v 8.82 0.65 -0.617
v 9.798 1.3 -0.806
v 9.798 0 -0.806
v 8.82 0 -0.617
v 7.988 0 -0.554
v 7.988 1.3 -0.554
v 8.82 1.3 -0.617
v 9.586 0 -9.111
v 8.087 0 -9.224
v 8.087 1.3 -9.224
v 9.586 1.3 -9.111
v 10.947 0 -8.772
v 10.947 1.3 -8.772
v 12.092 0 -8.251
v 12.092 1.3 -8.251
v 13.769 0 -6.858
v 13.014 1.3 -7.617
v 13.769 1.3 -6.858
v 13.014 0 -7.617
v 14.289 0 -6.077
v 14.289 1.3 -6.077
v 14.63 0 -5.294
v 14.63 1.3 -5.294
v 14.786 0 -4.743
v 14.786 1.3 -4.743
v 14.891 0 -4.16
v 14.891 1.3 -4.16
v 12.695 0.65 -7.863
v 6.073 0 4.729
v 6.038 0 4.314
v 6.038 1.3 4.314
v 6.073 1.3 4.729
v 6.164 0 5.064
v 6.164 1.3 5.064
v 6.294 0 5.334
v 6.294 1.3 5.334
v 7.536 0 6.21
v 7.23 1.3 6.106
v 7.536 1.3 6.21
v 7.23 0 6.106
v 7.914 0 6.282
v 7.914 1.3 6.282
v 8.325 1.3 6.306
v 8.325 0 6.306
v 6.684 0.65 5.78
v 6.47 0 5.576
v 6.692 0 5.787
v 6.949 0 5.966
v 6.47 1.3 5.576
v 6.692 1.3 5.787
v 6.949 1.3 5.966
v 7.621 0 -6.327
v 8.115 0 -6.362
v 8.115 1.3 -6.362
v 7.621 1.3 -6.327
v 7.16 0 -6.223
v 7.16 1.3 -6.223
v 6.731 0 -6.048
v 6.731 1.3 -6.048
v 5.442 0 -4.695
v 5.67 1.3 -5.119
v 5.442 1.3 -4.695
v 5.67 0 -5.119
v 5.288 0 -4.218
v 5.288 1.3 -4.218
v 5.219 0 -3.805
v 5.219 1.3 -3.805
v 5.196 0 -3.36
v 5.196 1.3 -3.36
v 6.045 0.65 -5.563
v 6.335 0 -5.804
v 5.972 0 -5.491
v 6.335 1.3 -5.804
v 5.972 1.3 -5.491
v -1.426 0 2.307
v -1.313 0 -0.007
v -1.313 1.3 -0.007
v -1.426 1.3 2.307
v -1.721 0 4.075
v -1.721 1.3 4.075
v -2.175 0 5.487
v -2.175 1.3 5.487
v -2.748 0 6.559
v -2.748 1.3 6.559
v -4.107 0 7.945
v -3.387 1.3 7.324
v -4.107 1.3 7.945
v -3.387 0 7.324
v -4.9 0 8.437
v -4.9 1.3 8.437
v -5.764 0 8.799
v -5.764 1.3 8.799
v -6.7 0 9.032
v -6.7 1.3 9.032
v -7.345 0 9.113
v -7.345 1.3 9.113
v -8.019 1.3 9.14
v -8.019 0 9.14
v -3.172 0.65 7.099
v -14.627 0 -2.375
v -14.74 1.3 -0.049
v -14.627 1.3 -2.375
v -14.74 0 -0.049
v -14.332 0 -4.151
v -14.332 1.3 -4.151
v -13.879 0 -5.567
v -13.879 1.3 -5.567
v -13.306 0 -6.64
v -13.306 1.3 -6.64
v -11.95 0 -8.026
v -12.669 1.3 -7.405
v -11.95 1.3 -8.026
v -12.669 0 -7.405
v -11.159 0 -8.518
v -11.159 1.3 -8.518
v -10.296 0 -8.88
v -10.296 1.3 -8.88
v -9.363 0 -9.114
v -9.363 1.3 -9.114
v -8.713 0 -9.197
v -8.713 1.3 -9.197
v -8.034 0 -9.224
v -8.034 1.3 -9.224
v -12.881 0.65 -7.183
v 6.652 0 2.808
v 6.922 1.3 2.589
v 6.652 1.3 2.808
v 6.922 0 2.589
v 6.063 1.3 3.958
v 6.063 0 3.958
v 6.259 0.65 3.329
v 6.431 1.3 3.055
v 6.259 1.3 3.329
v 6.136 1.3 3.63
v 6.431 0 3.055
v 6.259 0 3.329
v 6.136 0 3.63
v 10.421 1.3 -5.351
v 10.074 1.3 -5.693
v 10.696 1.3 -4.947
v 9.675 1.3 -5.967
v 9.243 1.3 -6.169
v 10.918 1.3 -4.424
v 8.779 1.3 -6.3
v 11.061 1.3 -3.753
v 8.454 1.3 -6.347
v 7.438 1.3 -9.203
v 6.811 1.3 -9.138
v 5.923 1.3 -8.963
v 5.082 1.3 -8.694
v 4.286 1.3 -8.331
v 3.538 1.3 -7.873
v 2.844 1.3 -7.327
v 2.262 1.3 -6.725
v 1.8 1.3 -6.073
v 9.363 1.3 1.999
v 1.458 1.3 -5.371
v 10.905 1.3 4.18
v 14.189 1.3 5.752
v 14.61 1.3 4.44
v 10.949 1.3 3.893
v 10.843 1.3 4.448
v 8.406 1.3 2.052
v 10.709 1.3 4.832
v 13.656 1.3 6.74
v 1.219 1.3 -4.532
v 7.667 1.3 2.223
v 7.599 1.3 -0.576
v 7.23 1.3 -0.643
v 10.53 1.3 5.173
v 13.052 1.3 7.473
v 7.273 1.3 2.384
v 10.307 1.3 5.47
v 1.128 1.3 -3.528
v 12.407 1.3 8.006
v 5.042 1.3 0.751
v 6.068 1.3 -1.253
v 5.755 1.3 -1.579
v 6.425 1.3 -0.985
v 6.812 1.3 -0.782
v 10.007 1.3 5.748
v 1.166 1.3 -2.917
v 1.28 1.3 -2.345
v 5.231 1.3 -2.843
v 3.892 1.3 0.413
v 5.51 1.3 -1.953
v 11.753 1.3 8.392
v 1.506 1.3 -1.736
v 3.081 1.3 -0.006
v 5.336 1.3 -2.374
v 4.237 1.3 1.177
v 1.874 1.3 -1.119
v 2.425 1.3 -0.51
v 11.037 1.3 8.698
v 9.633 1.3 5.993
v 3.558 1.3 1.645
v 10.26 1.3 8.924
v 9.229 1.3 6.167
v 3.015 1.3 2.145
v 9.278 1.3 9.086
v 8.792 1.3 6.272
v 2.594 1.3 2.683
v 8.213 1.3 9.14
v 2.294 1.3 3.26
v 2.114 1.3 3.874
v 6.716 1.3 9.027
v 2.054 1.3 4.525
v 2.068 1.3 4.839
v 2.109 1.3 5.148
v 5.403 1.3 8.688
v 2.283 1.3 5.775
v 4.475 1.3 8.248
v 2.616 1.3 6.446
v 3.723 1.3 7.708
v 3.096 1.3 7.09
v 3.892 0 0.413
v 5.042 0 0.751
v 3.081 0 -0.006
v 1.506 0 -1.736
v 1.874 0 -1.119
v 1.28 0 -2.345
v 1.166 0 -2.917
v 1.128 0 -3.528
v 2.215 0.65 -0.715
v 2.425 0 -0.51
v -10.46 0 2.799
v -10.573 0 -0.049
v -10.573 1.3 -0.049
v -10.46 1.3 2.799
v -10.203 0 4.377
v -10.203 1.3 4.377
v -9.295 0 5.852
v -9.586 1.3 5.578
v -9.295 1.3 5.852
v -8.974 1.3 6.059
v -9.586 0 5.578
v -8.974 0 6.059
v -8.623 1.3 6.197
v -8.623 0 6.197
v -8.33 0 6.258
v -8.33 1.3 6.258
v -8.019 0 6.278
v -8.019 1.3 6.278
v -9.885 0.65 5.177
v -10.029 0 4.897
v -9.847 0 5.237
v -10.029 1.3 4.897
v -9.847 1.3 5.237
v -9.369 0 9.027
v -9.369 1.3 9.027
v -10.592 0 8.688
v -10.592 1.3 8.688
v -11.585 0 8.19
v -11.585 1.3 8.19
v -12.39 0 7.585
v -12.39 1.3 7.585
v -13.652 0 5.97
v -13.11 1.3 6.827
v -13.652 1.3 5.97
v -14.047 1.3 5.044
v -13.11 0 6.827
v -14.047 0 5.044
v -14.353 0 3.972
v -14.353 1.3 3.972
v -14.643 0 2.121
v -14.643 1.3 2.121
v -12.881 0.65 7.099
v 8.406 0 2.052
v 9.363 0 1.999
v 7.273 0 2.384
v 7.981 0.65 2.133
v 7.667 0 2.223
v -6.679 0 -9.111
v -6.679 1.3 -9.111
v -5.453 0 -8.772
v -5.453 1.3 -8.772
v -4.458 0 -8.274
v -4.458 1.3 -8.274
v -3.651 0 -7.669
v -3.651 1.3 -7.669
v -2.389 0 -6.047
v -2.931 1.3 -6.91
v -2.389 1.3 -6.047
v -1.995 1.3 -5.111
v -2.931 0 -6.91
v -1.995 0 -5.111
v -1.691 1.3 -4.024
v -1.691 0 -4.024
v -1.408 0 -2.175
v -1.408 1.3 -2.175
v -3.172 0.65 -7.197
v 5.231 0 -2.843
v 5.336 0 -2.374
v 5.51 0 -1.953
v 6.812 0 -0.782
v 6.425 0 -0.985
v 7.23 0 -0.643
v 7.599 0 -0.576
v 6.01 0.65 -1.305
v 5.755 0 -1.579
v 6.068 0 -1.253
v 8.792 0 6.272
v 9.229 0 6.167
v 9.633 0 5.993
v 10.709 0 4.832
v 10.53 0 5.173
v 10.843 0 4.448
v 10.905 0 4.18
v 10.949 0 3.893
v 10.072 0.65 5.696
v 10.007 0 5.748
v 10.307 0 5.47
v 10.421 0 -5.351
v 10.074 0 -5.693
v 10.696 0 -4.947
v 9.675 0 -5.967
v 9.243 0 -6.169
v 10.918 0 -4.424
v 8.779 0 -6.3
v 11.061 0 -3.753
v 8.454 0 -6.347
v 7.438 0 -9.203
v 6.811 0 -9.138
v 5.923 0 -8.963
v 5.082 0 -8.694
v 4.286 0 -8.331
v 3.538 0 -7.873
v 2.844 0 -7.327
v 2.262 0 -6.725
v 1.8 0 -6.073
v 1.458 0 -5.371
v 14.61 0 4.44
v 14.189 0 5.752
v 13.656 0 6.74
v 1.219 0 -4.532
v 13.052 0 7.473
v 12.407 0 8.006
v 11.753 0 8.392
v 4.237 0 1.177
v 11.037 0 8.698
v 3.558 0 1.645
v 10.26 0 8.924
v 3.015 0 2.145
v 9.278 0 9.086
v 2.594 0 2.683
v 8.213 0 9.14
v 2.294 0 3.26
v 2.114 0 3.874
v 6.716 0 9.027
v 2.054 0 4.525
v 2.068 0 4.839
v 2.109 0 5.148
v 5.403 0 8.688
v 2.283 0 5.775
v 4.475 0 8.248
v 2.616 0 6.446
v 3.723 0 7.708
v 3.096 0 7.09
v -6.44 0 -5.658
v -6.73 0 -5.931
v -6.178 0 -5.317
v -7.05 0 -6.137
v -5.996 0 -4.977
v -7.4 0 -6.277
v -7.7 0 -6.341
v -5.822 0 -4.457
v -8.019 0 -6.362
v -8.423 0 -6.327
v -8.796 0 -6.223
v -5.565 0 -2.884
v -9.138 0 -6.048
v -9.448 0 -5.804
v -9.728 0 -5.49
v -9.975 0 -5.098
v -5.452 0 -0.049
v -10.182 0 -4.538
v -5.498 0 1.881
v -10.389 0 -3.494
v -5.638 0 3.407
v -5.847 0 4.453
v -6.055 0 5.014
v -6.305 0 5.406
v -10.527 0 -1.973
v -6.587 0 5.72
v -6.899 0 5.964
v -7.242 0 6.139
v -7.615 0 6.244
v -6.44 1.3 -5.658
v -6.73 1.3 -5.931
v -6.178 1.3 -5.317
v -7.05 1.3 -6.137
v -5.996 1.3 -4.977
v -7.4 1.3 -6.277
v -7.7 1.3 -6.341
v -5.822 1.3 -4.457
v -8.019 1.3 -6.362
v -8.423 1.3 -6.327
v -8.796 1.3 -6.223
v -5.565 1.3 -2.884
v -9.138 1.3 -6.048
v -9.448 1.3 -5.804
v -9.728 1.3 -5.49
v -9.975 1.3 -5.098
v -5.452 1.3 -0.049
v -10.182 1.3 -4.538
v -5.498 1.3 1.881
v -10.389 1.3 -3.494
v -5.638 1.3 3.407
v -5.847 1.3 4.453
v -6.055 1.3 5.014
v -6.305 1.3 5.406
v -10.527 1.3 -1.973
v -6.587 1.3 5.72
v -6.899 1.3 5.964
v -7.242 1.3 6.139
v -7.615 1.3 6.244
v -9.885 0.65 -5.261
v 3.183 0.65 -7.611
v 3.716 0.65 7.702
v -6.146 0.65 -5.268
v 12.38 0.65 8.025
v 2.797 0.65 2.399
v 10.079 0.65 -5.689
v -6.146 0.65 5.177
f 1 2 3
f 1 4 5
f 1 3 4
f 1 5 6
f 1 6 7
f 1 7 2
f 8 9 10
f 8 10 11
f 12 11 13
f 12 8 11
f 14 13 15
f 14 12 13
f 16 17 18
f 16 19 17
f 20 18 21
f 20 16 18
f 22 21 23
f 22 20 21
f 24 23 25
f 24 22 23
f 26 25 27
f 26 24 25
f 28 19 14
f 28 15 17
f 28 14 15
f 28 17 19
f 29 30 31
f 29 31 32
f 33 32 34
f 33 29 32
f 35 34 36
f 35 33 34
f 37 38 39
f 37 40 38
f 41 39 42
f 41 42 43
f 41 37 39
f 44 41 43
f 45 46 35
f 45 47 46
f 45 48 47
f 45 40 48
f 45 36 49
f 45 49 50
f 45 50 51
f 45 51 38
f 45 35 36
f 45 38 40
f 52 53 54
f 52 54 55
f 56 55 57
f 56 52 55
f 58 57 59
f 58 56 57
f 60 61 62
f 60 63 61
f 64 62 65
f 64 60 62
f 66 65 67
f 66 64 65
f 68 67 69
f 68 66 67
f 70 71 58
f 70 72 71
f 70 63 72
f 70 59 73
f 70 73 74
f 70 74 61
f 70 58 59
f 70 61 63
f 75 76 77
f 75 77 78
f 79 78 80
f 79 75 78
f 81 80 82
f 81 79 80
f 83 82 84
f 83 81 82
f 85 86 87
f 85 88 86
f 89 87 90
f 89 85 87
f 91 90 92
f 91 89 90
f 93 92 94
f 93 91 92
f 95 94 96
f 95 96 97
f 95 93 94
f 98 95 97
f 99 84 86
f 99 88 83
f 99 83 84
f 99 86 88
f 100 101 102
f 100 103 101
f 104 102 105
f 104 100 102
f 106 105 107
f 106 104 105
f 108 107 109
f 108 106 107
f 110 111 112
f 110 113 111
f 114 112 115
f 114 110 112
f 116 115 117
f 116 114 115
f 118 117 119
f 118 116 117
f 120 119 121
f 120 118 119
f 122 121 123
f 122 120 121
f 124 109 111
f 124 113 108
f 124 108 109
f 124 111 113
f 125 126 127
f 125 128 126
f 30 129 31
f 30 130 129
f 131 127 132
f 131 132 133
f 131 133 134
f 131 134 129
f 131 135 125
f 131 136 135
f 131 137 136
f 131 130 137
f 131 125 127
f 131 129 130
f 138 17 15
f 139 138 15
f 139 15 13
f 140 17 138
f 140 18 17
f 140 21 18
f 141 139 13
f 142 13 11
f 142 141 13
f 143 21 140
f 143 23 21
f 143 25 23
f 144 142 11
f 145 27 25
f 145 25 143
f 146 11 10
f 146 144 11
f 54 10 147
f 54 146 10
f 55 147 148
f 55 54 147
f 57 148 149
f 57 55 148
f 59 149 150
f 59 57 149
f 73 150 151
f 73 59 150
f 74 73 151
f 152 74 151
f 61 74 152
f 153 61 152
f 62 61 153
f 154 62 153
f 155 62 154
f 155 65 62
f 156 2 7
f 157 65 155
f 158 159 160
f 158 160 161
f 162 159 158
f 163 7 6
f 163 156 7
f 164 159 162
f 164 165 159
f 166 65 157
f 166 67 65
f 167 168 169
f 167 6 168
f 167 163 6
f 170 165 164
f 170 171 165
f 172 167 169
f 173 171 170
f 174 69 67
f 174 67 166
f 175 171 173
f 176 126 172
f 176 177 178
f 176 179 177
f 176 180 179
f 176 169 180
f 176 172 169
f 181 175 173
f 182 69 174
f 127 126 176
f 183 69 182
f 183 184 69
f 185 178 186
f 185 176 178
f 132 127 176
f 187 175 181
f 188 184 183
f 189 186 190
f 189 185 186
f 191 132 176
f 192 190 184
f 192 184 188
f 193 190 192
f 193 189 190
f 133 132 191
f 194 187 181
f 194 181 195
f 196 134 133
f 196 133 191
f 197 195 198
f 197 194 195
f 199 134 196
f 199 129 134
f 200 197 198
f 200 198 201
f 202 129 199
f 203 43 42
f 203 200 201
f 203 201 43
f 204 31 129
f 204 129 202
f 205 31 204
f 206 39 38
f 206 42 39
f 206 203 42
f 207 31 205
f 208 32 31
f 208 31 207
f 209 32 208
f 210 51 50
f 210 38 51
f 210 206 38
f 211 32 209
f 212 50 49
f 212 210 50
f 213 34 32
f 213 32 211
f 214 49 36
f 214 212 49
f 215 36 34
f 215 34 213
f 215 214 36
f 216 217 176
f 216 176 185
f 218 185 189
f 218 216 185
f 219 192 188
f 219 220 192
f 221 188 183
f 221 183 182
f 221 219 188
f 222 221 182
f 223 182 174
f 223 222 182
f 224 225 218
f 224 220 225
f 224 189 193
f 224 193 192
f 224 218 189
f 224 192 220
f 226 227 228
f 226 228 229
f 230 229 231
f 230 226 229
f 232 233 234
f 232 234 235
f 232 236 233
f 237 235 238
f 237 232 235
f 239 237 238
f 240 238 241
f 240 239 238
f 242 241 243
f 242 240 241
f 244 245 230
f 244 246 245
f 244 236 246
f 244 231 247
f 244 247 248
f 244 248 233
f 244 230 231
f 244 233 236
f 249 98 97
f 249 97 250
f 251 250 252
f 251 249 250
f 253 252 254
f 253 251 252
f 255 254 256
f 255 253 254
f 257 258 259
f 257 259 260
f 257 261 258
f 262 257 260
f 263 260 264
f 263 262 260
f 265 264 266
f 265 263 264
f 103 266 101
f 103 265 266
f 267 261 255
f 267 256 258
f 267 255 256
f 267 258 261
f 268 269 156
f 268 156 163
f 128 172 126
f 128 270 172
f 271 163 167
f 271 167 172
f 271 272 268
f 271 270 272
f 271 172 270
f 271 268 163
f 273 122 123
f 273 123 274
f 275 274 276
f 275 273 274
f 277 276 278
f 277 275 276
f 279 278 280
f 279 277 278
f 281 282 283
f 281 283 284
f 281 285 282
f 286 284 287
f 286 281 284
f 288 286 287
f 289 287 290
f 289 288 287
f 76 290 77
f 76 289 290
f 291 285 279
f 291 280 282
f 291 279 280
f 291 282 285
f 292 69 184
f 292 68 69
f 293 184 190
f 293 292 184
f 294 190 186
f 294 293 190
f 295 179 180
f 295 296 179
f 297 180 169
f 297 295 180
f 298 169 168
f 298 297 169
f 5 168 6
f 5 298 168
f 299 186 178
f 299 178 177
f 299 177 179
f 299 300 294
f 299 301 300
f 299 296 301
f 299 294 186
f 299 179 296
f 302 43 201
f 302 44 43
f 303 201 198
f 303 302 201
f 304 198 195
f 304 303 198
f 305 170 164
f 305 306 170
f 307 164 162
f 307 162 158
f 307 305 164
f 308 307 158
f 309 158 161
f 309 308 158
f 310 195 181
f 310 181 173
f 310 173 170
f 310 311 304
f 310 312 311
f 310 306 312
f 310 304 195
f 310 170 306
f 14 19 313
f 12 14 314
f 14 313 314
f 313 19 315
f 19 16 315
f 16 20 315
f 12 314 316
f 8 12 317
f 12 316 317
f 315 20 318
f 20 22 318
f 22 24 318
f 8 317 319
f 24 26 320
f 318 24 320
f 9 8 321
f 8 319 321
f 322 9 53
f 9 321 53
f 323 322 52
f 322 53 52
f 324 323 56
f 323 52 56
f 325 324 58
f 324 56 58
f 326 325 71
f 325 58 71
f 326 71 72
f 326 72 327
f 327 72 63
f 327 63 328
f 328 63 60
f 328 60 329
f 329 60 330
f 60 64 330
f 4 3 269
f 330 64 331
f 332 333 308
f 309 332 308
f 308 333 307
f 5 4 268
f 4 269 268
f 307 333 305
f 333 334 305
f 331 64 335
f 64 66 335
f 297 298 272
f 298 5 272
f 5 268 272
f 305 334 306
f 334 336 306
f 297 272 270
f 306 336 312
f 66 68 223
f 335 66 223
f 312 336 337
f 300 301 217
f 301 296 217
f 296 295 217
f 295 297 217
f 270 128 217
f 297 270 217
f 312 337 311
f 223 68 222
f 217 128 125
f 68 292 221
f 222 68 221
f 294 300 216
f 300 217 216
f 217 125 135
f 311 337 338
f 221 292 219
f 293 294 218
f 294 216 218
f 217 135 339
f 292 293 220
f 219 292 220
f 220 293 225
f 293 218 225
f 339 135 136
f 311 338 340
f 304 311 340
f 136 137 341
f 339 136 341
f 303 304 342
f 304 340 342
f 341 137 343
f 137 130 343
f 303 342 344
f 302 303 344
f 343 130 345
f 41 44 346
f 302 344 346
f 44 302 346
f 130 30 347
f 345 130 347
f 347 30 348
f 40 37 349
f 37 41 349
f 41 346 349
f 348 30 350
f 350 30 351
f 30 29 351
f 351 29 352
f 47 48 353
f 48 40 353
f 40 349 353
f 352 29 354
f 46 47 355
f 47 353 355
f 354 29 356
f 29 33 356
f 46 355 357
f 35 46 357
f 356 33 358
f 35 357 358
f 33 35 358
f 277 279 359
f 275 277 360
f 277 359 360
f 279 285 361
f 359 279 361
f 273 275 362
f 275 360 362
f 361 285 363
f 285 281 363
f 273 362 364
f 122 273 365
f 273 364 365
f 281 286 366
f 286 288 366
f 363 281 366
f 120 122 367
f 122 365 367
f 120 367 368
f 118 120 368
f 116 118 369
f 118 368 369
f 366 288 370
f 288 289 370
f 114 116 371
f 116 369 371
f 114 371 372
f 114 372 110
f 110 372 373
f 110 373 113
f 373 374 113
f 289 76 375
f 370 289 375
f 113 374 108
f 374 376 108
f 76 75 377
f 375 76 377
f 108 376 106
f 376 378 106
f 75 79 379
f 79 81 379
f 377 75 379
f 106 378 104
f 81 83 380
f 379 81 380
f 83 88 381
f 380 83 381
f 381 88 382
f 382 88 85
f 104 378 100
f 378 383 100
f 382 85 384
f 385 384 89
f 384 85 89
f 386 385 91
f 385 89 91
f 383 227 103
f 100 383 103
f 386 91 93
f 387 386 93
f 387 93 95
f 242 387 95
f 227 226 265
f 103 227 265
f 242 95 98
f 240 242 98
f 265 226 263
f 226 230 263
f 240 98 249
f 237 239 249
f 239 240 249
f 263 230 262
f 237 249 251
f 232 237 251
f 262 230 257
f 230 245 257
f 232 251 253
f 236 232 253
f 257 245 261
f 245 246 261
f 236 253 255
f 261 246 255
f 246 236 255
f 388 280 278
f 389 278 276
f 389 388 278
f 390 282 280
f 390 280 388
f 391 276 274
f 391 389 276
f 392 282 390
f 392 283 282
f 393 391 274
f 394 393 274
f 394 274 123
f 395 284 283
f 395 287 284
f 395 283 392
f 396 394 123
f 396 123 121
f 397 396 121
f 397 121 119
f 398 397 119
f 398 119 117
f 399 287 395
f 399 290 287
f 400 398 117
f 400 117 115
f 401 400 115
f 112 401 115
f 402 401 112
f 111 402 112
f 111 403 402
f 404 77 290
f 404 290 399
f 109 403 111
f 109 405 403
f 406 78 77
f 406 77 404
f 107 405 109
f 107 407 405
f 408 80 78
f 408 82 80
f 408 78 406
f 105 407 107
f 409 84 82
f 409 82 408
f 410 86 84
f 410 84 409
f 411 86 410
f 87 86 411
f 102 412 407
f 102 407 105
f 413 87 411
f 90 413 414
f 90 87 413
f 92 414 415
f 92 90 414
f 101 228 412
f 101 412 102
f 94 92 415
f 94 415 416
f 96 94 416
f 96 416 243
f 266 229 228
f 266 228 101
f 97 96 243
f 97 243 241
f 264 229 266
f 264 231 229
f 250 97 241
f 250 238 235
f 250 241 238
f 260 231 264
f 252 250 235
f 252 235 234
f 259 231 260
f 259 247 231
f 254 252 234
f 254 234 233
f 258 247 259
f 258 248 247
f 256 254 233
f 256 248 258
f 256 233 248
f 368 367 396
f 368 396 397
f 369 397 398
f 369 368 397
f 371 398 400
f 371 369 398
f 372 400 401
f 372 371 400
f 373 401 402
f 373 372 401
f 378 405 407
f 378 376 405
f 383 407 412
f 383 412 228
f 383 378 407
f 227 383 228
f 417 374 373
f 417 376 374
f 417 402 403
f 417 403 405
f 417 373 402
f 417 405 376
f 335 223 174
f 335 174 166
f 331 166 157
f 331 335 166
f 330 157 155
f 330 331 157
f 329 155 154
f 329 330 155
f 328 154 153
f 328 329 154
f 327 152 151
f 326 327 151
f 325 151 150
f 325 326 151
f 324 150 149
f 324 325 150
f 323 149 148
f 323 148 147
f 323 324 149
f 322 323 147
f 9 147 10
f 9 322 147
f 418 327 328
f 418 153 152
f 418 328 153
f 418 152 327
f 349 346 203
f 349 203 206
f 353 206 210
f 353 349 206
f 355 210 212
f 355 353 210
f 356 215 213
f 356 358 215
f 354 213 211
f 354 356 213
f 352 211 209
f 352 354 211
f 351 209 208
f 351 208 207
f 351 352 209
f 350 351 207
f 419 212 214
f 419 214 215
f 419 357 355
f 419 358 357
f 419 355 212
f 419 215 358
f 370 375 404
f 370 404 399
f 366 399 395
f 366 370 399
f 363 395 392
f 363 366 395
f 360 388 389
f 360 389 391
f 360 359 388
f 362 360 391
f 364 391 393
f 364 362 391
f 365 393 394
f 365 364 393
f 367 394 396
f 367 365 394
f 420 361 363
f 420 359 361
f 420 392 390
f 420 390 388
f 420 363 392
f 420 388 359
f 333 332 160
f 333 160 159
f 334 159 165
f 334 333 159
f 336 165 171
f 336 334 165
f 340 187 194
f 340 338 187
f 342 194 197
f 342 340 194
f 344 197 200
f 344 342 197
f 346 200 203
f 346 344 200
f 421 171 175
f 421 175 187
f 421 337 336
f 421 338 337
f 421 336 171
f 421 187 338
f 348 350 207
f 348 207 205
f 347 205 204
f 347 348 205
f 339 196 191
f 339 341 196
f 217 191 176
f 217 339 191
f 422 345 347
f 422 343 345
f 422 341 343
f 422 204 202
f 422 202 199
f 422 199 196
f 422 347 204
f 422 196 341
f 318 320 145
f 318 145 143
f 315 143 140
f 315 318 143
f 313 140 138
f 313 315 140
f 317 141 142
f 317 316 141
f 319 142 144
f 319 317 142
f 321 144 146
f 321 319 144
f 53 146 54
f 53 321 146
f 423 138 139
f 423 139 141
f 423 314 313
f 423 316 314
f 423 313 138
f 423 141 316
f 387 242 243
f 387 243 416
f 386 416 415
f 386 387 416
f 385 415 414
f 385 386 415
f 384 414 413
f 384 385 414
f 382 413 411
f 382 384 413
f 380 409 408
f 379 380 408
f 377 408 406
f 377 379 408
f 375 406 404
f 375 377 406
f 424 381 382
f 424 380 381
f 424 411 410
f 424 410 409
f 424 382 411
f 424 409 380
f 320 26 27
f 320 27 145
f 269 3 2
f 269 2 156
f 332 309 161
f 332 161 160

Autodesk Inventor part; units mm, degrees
ref_plane "YZ Plane" through (0, 0, 0) normal (1, 0, 0) x (0, 1, 0)
ref_plane "XZ Plane" through (0, 0, 0) normal (0, 1, 0) x (-1, 0, 0)
ref_plane "XY Plane" through (0, 0, 0) normal (0, 0, 1) x (1, 0, 0)
sketch "Sketch1" plane through (0, 0, 0) normal (0, 1, 0) x (-1, 0, 0)
  line L0 (-15.9712, 9.1405) -> (15.5875, 9.1405) construction
  line L1 (15.5875, 9.1405) -> (15.5875, -9.9475) construction
  line L2 (15.5875, -9.9475) -> (-15.9712, -9.9475) construction
  line L3 (-15.9712, -9.9475) -> (-15.9712, 9.1405) construction
  line L4 (-14.8909, -4.1596) -> (-11.0608, -3.7528)
  spline S0 degree 2 poles (-11.0608, -3.7528) (-10.9065, -5.0154) (-9.251, -6.3623) (-8.1146, -6.3623) knots 0 0 0 1 2 2 2
  spline S1 degree 2 poles (-8.1146, -6.3623) (-6.894, -6.3623) (-5.1965, -4.7629) (-5.1965, -3.3599) knots 0 0 0 1 2 2 2
  spline S2 degree 2 poles (-5.1965, -3.3599) (-5.1965, -2.0552) (-6.8239, -0.554) (-7.9884, -0.554) knots 0 0 0 1 2 2 2
  spline S3 degree 2 poles (-7.9884, -0.554) (-8.746, -0.554) (-9.7982, -0.8065) knots 0 0 0 1 1 1
  line L5 (-9.7982, -0.8065) -> (-9.3633, 1.9994)
  spline S4 degree 2 poles (-9.3633, 1.9994) (-7.82, 1.9713) (-6.9221, 2.5886) knots 0 0 0 1 1 1
  spline S5 degree 2 poles (-6.9221, 2.5886) (-6.0382, 3.2059) (-6.0382, 4.3143) knots 0 0 0 1 1 1
  spline S6 degree 2 poles (-6.0382, 4.3143) (-6.0382, 5.2543) (-7.329, 6.3065) (-8.3251, 6.3065) knots 0 0 0 1 2 2 2
  spline S7 degree 2 poles (-8.3251, 6.3065) (-9.3352, 6.3065) (-10.8083, 5.0859) (-10.9486, 3.8934) knots 0 0 0 1 2 2 2
  line L6 (-10.9486, 3.8934) -> (-14.6103, 4.4405)
  spline S8 degree 2 poles (-14.6103, 4.4405) (-14.0351, 6.9098) (-10.7241, 9.1405) (-8.2128, 9.1405) knots 0 0 0 1 2 2 2
  spline S9 degree 2 poles (-8.2128, 9.1405) (-5.3788, 9.1405) (-2.0538, 6.2644) (-2.0538, 4.5247) knots 0 0 0 1 2 2 2
  spline S10 degree 2 poles (-2.0538, 4.5247) (-2.0538, 3.3462) (-3.541, 1.4522) (-5.0421, 0.7508) knots 0 0 0 1 2 2 2
  spline S11 degree 2 poles (-5.0421, 0.7508) (-3.3025, 0.414) (-1.1279, -1.8447) (-1.1279, -3.5283) knots 0 0 0 1 2 2 2
  spline S12 degree 2 poles (-1.1279, -3.5283) (-1.1279, -5.9975) (-5.2386, -9.2243) (-8.0866, -9.2243) knots 0 0 0 1 2 2 2
  spline S13 degree 2 poles (-8.0866, -9.2243) (-10.8083, -9.2243) (-14.5823, -6.5026) (-14.8909, -4.1596) knots 0 0 0 1 2 2 2
  spline S14 degree 2 poles (8.0194, 9.1405) (11.0218, 9.1405) (14.7396, 5.0578) (14.7396, -0.0489) knots 0 0 0 1 2 2 2
  spline S15 degree 2 poles (14.7396, -0.0489) (14.7396, -5.1417) (11.0218, -9.2243) (8.0335, -9.2243) knots 0 0 0 1 2 2 2
  spline S16 degree 2 poles (8.0335, -9.2243) (5.0311, -9.2243) (1.3133, -5.1697) (1.3133, -0.0068) knots 0 0 0 1 2 2 2
  spline S17 degree 2 poles (1.3133, -0.0068) (1.3133, 5.0578) (5.0311, 9.1405) (8.0194, 9.1405) knots 0 0 0 1 2 2 2
  spline S18 degree 2 poles (8.0194, 6.2784) (6.8409, 6.2784) (5.452, 4.0758) (5.452, -0.0489) knots 0 0 0 1 2 2 2
  spline S19 degree 2 poles (5.452, -0.0489) (5.452, -4.1736) (6.8409, -6.3623) (8.0194, -6.3623) knots 0 0 0 1 2 2 2
  spline S20 degree 2 poles (8.0194, -6.3623) (9.1979, -6.3623) (10.5728, -4.1596) (10.5728, -0.0489) knots 0 0 0 1 2 2 2
  spline S21 degree 2 poles (10.5728, -0.0489) (10.5728, 4.0758) (9.1979, 6.2784) (8.0194, 6.2784) knots 0 0 0 1 2 2 2
  point P0 (0, 0)
extrude "Extrusion1" add sketch "Sketch1" along normal blind 1.3
properties part number "30"
